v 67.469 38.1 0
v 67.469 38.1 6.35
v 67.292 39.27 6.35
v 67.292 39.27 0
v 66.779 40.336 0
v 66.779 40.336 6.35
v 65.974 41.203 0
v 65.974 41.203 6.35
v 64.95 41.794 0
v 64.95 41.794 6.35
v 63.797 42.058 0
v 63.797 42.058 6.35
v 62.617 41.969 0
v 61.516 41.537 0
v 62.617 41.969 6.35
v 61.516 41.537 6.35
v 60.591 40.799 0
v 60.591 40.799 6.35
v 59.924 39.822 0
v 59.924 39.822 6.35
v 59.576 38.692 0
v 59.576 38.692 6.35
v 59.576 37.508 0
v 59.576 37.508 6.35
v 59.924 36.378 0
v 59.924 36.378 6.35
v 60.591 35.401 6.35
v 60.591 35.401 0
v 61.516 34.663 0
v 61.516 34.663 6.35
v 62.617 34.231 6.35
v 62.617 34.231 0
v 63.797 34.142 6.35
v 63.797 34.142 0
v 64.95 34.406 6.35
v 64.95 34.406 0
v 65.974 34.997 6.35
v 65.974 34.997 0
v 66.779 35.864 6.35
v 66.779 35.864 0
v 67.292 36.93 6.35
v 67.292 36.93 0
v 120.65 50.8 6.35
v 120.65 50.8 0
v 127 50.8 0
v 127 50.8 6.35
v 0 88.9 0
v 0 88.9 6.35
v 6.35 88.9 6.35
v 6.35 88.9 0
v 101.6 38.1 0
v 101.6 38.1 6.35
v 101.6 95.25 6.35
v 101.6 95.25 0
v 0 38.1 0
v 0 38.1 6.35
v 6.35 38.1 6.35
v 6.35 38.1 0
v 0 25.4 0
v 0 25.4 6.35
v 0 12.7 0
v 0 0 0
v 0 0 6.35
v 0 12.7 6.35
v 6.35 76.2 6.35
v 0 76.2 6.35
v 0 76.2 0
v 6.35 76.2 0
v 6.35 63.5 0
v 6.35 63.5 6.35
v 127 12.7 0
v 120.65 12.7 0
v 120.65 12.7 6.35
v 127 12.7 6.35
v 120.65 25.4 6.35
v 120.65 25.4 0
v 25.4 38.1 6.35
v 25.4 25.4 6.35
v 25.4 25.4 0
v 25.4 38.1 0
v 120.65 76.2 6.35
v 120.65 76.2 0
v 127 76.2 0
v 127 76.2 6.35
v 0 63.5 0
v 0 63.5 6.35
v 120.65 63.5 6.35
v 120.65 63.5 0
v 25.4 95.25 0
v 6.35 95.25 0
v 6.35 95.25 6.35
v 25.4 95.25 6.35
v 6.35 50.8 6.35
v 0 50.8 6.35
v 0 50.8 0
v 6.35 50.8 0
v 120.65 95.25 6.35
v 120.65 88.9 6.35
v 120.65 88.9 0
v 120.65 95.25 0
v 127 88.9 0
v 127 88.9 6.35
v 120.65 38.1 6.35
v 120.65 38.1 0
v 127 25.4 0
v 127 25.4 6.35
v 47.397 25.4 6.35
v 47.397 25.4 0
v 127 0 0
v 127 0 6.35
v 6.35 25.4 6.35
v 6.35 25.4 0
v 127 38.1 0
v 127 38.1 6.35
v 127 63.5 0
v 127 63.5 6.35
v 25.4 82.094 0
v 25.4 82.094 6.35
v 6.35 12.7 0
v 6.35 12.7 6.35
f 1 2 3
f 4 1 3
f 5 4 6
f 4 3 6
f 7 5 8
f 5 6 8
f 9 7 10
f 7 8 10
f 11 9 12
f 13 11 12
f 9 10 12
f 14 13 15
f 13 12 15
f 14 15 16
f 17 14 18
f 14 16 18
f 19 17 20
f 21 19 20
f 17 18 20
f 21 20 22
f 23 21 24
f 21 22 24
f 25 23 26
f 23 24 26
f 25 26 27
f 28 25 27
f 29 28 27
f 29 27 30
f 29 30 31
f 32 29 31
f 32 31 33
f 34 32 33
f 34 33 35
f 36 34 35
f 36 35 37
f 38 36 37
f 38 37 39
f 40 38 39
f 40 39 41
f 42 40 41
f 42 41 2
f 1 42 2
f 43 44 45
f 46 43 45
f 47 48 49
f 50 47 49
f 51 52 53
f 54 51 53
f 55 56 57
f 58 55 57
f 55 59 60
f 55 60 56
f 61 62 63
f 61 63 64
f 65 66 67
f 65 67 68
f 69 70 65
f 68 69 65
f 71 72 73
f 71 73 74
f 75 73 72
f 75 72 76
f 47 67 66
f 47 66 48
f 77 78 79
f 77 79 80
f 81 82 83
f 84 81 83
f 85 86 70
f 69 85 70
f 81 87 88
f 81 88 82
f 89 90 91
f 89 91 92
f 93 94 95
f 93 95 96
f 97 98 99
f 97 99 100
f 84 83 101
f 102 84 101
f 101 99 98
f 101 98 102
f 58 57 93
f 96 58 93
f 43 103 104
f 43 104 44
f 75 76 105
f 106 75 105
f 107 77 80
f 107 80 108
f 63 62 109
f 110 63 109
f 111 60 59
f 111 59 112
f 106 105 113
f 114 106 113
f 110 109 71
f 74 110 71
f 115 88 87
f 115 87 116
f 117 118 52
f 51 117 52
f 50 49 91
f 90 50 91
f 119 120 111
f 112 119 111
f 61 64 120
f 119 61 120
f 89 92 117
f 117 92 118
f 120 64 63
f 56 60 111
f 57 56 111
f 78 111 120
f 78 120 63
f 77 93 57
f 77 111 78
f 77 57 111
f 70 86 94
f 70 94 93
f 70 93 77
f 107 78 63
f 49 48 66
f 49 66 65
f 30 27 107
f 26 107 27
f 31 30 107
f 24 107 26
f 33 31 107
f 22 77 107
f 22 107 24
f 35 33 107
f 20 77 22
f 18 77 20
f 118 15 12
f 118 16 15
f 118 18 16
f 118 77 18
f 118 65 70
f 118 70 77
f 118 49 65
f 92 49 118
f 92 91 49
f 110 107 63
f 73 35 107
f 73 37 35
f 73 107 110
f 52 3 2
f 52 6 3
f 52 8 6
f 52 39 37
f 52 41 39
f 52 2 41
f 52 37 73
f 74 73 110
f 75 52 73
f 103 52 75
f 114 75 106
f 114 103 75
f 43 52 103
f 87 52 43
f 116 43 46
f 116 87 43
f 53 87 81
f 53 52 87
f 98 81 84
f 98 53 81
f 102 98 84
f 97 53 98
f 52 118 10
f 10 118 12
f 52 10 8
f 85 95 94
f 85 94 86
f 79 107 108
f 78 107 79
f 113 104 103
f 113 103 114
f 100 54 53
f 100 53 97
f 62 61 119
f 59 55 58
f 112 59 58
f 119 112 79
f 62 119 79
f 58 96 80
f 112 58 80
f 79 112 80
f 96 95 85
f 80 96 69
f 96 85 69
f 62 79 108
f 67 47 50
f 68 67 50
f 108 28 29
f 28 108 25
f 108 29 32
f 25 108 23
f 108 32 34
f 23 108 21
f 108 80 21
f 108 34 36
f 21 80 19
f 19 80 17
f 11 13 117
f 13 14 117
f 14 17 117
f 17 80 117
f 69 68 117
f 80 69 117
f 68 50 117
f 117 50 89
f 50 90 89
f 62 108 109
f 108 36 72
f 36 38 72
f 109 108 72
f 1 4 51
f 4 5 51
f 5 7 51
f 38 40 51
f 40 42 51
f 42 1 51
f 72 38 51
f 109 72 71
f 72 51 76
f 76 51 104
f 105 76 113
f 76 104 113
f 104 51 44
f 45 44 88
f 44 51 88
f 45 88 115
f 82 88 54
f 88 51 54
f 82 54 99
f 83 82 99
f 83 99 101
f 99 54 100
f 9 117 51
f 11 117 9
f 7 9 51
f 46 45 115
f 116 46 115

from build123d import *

# Parameters (mm, degrees)
SKETCH1_W           = 127
SKETCH1_H           = 95.25
BOSS_EXTRUDE1_DEPTH = 6.35
SKETCH2_R           = 3.96875
CUT_EXTRUDE1_DEPTH  = 7.35
SKETCH3_W           = 6.35
SKETCH3_H           = 12.7
CUT_EXTRUDE2_DEPTH  = 7.35
SKETCH4_W           = 6.35
SKETCH4_H           = 12.7
CUT_EXTRUDE3_DEPTH  = 7.35
LPATTERN1_COUNT     = 4
LPATTERN1_PITCH     = 25.4
CUT_EXTRUDE4_DEPTH  = 7.35


with BuildPart() as part:
    # Sketch1 → Boss-Extrude1 (new body)
    with BuildSketch(Plane.XY):
        with Locations((63.5, 47.625)):
            Rectangle(SKETCH1_W, SKETCH1_H)
    extrude(amount=BOSS_EXTRUDE1_DEPTH)

    # Sketch2 → Cut-Extrude1 (cut, through all)
    with BuildSketch(Plane.XY.offset(6.35)):
        with Locations((63.5, 38.1)):
            Circle(SKETCH2_R)
    extrude(amount=-CUT_EXTRUDE1_DEPTH, mode=Mode.SUBTRACT)

    # Sketch3 → Cut-Extrude2 (cut, through all)
    with BuildSketch(Plane.XY.offset(6.35)):
        with Locations((3.175, 19.05)):
            Rectangle(SKETCH3_W, SKETCH3_H)
    cut_extrude2 = extrude(amount=-CUT_EXTRUDE2_DEPTH, mode=Mode.SUBTRACT)

    # Sketch4 → Cut-Extrude3 (cut, through all)
    with BuildSketch(Plane.XY.offset(6.35)):
        with Locations((123.825, 19.05)):
            Rectangle(SKETCH4_W, SKETCH4_H)
    cut_extrude3 = extrude(amount=-CUT_EXTRUDE3_DEPTH, mode=Mode.SUBTRACT)

    # LPattern1: Cut-Extrude2, Cut-Extrude3 ×4
    with Locations(*[(0, i * LPATTERN1_PITCH, 0) for i in range(1, LPATTERN1_COUNT)]):
        add(cut_extrude2, mode=Mode.SUBTRACT)
        add(cut_extrude3, mode=Mode.SUBTRACT)

    # Sketch5 → Cut-Extrude4 (cut, through all)
    with BuildSketch(Plane.XY.offset(6.35)):
        Polygon((25.4, 95.25), (25.4, 82.094090512), (101.6, 38.1), (101.6, 95.25), align=None)
        Polygon((25.4, 38.1), (47.397045256, 25.4), (25.4, 25.4), align=None)
    extrude(amount=-CUT_EXTRUDE4_DEPTH, mode=Mode.SUBTRACT)


solid = part.part
